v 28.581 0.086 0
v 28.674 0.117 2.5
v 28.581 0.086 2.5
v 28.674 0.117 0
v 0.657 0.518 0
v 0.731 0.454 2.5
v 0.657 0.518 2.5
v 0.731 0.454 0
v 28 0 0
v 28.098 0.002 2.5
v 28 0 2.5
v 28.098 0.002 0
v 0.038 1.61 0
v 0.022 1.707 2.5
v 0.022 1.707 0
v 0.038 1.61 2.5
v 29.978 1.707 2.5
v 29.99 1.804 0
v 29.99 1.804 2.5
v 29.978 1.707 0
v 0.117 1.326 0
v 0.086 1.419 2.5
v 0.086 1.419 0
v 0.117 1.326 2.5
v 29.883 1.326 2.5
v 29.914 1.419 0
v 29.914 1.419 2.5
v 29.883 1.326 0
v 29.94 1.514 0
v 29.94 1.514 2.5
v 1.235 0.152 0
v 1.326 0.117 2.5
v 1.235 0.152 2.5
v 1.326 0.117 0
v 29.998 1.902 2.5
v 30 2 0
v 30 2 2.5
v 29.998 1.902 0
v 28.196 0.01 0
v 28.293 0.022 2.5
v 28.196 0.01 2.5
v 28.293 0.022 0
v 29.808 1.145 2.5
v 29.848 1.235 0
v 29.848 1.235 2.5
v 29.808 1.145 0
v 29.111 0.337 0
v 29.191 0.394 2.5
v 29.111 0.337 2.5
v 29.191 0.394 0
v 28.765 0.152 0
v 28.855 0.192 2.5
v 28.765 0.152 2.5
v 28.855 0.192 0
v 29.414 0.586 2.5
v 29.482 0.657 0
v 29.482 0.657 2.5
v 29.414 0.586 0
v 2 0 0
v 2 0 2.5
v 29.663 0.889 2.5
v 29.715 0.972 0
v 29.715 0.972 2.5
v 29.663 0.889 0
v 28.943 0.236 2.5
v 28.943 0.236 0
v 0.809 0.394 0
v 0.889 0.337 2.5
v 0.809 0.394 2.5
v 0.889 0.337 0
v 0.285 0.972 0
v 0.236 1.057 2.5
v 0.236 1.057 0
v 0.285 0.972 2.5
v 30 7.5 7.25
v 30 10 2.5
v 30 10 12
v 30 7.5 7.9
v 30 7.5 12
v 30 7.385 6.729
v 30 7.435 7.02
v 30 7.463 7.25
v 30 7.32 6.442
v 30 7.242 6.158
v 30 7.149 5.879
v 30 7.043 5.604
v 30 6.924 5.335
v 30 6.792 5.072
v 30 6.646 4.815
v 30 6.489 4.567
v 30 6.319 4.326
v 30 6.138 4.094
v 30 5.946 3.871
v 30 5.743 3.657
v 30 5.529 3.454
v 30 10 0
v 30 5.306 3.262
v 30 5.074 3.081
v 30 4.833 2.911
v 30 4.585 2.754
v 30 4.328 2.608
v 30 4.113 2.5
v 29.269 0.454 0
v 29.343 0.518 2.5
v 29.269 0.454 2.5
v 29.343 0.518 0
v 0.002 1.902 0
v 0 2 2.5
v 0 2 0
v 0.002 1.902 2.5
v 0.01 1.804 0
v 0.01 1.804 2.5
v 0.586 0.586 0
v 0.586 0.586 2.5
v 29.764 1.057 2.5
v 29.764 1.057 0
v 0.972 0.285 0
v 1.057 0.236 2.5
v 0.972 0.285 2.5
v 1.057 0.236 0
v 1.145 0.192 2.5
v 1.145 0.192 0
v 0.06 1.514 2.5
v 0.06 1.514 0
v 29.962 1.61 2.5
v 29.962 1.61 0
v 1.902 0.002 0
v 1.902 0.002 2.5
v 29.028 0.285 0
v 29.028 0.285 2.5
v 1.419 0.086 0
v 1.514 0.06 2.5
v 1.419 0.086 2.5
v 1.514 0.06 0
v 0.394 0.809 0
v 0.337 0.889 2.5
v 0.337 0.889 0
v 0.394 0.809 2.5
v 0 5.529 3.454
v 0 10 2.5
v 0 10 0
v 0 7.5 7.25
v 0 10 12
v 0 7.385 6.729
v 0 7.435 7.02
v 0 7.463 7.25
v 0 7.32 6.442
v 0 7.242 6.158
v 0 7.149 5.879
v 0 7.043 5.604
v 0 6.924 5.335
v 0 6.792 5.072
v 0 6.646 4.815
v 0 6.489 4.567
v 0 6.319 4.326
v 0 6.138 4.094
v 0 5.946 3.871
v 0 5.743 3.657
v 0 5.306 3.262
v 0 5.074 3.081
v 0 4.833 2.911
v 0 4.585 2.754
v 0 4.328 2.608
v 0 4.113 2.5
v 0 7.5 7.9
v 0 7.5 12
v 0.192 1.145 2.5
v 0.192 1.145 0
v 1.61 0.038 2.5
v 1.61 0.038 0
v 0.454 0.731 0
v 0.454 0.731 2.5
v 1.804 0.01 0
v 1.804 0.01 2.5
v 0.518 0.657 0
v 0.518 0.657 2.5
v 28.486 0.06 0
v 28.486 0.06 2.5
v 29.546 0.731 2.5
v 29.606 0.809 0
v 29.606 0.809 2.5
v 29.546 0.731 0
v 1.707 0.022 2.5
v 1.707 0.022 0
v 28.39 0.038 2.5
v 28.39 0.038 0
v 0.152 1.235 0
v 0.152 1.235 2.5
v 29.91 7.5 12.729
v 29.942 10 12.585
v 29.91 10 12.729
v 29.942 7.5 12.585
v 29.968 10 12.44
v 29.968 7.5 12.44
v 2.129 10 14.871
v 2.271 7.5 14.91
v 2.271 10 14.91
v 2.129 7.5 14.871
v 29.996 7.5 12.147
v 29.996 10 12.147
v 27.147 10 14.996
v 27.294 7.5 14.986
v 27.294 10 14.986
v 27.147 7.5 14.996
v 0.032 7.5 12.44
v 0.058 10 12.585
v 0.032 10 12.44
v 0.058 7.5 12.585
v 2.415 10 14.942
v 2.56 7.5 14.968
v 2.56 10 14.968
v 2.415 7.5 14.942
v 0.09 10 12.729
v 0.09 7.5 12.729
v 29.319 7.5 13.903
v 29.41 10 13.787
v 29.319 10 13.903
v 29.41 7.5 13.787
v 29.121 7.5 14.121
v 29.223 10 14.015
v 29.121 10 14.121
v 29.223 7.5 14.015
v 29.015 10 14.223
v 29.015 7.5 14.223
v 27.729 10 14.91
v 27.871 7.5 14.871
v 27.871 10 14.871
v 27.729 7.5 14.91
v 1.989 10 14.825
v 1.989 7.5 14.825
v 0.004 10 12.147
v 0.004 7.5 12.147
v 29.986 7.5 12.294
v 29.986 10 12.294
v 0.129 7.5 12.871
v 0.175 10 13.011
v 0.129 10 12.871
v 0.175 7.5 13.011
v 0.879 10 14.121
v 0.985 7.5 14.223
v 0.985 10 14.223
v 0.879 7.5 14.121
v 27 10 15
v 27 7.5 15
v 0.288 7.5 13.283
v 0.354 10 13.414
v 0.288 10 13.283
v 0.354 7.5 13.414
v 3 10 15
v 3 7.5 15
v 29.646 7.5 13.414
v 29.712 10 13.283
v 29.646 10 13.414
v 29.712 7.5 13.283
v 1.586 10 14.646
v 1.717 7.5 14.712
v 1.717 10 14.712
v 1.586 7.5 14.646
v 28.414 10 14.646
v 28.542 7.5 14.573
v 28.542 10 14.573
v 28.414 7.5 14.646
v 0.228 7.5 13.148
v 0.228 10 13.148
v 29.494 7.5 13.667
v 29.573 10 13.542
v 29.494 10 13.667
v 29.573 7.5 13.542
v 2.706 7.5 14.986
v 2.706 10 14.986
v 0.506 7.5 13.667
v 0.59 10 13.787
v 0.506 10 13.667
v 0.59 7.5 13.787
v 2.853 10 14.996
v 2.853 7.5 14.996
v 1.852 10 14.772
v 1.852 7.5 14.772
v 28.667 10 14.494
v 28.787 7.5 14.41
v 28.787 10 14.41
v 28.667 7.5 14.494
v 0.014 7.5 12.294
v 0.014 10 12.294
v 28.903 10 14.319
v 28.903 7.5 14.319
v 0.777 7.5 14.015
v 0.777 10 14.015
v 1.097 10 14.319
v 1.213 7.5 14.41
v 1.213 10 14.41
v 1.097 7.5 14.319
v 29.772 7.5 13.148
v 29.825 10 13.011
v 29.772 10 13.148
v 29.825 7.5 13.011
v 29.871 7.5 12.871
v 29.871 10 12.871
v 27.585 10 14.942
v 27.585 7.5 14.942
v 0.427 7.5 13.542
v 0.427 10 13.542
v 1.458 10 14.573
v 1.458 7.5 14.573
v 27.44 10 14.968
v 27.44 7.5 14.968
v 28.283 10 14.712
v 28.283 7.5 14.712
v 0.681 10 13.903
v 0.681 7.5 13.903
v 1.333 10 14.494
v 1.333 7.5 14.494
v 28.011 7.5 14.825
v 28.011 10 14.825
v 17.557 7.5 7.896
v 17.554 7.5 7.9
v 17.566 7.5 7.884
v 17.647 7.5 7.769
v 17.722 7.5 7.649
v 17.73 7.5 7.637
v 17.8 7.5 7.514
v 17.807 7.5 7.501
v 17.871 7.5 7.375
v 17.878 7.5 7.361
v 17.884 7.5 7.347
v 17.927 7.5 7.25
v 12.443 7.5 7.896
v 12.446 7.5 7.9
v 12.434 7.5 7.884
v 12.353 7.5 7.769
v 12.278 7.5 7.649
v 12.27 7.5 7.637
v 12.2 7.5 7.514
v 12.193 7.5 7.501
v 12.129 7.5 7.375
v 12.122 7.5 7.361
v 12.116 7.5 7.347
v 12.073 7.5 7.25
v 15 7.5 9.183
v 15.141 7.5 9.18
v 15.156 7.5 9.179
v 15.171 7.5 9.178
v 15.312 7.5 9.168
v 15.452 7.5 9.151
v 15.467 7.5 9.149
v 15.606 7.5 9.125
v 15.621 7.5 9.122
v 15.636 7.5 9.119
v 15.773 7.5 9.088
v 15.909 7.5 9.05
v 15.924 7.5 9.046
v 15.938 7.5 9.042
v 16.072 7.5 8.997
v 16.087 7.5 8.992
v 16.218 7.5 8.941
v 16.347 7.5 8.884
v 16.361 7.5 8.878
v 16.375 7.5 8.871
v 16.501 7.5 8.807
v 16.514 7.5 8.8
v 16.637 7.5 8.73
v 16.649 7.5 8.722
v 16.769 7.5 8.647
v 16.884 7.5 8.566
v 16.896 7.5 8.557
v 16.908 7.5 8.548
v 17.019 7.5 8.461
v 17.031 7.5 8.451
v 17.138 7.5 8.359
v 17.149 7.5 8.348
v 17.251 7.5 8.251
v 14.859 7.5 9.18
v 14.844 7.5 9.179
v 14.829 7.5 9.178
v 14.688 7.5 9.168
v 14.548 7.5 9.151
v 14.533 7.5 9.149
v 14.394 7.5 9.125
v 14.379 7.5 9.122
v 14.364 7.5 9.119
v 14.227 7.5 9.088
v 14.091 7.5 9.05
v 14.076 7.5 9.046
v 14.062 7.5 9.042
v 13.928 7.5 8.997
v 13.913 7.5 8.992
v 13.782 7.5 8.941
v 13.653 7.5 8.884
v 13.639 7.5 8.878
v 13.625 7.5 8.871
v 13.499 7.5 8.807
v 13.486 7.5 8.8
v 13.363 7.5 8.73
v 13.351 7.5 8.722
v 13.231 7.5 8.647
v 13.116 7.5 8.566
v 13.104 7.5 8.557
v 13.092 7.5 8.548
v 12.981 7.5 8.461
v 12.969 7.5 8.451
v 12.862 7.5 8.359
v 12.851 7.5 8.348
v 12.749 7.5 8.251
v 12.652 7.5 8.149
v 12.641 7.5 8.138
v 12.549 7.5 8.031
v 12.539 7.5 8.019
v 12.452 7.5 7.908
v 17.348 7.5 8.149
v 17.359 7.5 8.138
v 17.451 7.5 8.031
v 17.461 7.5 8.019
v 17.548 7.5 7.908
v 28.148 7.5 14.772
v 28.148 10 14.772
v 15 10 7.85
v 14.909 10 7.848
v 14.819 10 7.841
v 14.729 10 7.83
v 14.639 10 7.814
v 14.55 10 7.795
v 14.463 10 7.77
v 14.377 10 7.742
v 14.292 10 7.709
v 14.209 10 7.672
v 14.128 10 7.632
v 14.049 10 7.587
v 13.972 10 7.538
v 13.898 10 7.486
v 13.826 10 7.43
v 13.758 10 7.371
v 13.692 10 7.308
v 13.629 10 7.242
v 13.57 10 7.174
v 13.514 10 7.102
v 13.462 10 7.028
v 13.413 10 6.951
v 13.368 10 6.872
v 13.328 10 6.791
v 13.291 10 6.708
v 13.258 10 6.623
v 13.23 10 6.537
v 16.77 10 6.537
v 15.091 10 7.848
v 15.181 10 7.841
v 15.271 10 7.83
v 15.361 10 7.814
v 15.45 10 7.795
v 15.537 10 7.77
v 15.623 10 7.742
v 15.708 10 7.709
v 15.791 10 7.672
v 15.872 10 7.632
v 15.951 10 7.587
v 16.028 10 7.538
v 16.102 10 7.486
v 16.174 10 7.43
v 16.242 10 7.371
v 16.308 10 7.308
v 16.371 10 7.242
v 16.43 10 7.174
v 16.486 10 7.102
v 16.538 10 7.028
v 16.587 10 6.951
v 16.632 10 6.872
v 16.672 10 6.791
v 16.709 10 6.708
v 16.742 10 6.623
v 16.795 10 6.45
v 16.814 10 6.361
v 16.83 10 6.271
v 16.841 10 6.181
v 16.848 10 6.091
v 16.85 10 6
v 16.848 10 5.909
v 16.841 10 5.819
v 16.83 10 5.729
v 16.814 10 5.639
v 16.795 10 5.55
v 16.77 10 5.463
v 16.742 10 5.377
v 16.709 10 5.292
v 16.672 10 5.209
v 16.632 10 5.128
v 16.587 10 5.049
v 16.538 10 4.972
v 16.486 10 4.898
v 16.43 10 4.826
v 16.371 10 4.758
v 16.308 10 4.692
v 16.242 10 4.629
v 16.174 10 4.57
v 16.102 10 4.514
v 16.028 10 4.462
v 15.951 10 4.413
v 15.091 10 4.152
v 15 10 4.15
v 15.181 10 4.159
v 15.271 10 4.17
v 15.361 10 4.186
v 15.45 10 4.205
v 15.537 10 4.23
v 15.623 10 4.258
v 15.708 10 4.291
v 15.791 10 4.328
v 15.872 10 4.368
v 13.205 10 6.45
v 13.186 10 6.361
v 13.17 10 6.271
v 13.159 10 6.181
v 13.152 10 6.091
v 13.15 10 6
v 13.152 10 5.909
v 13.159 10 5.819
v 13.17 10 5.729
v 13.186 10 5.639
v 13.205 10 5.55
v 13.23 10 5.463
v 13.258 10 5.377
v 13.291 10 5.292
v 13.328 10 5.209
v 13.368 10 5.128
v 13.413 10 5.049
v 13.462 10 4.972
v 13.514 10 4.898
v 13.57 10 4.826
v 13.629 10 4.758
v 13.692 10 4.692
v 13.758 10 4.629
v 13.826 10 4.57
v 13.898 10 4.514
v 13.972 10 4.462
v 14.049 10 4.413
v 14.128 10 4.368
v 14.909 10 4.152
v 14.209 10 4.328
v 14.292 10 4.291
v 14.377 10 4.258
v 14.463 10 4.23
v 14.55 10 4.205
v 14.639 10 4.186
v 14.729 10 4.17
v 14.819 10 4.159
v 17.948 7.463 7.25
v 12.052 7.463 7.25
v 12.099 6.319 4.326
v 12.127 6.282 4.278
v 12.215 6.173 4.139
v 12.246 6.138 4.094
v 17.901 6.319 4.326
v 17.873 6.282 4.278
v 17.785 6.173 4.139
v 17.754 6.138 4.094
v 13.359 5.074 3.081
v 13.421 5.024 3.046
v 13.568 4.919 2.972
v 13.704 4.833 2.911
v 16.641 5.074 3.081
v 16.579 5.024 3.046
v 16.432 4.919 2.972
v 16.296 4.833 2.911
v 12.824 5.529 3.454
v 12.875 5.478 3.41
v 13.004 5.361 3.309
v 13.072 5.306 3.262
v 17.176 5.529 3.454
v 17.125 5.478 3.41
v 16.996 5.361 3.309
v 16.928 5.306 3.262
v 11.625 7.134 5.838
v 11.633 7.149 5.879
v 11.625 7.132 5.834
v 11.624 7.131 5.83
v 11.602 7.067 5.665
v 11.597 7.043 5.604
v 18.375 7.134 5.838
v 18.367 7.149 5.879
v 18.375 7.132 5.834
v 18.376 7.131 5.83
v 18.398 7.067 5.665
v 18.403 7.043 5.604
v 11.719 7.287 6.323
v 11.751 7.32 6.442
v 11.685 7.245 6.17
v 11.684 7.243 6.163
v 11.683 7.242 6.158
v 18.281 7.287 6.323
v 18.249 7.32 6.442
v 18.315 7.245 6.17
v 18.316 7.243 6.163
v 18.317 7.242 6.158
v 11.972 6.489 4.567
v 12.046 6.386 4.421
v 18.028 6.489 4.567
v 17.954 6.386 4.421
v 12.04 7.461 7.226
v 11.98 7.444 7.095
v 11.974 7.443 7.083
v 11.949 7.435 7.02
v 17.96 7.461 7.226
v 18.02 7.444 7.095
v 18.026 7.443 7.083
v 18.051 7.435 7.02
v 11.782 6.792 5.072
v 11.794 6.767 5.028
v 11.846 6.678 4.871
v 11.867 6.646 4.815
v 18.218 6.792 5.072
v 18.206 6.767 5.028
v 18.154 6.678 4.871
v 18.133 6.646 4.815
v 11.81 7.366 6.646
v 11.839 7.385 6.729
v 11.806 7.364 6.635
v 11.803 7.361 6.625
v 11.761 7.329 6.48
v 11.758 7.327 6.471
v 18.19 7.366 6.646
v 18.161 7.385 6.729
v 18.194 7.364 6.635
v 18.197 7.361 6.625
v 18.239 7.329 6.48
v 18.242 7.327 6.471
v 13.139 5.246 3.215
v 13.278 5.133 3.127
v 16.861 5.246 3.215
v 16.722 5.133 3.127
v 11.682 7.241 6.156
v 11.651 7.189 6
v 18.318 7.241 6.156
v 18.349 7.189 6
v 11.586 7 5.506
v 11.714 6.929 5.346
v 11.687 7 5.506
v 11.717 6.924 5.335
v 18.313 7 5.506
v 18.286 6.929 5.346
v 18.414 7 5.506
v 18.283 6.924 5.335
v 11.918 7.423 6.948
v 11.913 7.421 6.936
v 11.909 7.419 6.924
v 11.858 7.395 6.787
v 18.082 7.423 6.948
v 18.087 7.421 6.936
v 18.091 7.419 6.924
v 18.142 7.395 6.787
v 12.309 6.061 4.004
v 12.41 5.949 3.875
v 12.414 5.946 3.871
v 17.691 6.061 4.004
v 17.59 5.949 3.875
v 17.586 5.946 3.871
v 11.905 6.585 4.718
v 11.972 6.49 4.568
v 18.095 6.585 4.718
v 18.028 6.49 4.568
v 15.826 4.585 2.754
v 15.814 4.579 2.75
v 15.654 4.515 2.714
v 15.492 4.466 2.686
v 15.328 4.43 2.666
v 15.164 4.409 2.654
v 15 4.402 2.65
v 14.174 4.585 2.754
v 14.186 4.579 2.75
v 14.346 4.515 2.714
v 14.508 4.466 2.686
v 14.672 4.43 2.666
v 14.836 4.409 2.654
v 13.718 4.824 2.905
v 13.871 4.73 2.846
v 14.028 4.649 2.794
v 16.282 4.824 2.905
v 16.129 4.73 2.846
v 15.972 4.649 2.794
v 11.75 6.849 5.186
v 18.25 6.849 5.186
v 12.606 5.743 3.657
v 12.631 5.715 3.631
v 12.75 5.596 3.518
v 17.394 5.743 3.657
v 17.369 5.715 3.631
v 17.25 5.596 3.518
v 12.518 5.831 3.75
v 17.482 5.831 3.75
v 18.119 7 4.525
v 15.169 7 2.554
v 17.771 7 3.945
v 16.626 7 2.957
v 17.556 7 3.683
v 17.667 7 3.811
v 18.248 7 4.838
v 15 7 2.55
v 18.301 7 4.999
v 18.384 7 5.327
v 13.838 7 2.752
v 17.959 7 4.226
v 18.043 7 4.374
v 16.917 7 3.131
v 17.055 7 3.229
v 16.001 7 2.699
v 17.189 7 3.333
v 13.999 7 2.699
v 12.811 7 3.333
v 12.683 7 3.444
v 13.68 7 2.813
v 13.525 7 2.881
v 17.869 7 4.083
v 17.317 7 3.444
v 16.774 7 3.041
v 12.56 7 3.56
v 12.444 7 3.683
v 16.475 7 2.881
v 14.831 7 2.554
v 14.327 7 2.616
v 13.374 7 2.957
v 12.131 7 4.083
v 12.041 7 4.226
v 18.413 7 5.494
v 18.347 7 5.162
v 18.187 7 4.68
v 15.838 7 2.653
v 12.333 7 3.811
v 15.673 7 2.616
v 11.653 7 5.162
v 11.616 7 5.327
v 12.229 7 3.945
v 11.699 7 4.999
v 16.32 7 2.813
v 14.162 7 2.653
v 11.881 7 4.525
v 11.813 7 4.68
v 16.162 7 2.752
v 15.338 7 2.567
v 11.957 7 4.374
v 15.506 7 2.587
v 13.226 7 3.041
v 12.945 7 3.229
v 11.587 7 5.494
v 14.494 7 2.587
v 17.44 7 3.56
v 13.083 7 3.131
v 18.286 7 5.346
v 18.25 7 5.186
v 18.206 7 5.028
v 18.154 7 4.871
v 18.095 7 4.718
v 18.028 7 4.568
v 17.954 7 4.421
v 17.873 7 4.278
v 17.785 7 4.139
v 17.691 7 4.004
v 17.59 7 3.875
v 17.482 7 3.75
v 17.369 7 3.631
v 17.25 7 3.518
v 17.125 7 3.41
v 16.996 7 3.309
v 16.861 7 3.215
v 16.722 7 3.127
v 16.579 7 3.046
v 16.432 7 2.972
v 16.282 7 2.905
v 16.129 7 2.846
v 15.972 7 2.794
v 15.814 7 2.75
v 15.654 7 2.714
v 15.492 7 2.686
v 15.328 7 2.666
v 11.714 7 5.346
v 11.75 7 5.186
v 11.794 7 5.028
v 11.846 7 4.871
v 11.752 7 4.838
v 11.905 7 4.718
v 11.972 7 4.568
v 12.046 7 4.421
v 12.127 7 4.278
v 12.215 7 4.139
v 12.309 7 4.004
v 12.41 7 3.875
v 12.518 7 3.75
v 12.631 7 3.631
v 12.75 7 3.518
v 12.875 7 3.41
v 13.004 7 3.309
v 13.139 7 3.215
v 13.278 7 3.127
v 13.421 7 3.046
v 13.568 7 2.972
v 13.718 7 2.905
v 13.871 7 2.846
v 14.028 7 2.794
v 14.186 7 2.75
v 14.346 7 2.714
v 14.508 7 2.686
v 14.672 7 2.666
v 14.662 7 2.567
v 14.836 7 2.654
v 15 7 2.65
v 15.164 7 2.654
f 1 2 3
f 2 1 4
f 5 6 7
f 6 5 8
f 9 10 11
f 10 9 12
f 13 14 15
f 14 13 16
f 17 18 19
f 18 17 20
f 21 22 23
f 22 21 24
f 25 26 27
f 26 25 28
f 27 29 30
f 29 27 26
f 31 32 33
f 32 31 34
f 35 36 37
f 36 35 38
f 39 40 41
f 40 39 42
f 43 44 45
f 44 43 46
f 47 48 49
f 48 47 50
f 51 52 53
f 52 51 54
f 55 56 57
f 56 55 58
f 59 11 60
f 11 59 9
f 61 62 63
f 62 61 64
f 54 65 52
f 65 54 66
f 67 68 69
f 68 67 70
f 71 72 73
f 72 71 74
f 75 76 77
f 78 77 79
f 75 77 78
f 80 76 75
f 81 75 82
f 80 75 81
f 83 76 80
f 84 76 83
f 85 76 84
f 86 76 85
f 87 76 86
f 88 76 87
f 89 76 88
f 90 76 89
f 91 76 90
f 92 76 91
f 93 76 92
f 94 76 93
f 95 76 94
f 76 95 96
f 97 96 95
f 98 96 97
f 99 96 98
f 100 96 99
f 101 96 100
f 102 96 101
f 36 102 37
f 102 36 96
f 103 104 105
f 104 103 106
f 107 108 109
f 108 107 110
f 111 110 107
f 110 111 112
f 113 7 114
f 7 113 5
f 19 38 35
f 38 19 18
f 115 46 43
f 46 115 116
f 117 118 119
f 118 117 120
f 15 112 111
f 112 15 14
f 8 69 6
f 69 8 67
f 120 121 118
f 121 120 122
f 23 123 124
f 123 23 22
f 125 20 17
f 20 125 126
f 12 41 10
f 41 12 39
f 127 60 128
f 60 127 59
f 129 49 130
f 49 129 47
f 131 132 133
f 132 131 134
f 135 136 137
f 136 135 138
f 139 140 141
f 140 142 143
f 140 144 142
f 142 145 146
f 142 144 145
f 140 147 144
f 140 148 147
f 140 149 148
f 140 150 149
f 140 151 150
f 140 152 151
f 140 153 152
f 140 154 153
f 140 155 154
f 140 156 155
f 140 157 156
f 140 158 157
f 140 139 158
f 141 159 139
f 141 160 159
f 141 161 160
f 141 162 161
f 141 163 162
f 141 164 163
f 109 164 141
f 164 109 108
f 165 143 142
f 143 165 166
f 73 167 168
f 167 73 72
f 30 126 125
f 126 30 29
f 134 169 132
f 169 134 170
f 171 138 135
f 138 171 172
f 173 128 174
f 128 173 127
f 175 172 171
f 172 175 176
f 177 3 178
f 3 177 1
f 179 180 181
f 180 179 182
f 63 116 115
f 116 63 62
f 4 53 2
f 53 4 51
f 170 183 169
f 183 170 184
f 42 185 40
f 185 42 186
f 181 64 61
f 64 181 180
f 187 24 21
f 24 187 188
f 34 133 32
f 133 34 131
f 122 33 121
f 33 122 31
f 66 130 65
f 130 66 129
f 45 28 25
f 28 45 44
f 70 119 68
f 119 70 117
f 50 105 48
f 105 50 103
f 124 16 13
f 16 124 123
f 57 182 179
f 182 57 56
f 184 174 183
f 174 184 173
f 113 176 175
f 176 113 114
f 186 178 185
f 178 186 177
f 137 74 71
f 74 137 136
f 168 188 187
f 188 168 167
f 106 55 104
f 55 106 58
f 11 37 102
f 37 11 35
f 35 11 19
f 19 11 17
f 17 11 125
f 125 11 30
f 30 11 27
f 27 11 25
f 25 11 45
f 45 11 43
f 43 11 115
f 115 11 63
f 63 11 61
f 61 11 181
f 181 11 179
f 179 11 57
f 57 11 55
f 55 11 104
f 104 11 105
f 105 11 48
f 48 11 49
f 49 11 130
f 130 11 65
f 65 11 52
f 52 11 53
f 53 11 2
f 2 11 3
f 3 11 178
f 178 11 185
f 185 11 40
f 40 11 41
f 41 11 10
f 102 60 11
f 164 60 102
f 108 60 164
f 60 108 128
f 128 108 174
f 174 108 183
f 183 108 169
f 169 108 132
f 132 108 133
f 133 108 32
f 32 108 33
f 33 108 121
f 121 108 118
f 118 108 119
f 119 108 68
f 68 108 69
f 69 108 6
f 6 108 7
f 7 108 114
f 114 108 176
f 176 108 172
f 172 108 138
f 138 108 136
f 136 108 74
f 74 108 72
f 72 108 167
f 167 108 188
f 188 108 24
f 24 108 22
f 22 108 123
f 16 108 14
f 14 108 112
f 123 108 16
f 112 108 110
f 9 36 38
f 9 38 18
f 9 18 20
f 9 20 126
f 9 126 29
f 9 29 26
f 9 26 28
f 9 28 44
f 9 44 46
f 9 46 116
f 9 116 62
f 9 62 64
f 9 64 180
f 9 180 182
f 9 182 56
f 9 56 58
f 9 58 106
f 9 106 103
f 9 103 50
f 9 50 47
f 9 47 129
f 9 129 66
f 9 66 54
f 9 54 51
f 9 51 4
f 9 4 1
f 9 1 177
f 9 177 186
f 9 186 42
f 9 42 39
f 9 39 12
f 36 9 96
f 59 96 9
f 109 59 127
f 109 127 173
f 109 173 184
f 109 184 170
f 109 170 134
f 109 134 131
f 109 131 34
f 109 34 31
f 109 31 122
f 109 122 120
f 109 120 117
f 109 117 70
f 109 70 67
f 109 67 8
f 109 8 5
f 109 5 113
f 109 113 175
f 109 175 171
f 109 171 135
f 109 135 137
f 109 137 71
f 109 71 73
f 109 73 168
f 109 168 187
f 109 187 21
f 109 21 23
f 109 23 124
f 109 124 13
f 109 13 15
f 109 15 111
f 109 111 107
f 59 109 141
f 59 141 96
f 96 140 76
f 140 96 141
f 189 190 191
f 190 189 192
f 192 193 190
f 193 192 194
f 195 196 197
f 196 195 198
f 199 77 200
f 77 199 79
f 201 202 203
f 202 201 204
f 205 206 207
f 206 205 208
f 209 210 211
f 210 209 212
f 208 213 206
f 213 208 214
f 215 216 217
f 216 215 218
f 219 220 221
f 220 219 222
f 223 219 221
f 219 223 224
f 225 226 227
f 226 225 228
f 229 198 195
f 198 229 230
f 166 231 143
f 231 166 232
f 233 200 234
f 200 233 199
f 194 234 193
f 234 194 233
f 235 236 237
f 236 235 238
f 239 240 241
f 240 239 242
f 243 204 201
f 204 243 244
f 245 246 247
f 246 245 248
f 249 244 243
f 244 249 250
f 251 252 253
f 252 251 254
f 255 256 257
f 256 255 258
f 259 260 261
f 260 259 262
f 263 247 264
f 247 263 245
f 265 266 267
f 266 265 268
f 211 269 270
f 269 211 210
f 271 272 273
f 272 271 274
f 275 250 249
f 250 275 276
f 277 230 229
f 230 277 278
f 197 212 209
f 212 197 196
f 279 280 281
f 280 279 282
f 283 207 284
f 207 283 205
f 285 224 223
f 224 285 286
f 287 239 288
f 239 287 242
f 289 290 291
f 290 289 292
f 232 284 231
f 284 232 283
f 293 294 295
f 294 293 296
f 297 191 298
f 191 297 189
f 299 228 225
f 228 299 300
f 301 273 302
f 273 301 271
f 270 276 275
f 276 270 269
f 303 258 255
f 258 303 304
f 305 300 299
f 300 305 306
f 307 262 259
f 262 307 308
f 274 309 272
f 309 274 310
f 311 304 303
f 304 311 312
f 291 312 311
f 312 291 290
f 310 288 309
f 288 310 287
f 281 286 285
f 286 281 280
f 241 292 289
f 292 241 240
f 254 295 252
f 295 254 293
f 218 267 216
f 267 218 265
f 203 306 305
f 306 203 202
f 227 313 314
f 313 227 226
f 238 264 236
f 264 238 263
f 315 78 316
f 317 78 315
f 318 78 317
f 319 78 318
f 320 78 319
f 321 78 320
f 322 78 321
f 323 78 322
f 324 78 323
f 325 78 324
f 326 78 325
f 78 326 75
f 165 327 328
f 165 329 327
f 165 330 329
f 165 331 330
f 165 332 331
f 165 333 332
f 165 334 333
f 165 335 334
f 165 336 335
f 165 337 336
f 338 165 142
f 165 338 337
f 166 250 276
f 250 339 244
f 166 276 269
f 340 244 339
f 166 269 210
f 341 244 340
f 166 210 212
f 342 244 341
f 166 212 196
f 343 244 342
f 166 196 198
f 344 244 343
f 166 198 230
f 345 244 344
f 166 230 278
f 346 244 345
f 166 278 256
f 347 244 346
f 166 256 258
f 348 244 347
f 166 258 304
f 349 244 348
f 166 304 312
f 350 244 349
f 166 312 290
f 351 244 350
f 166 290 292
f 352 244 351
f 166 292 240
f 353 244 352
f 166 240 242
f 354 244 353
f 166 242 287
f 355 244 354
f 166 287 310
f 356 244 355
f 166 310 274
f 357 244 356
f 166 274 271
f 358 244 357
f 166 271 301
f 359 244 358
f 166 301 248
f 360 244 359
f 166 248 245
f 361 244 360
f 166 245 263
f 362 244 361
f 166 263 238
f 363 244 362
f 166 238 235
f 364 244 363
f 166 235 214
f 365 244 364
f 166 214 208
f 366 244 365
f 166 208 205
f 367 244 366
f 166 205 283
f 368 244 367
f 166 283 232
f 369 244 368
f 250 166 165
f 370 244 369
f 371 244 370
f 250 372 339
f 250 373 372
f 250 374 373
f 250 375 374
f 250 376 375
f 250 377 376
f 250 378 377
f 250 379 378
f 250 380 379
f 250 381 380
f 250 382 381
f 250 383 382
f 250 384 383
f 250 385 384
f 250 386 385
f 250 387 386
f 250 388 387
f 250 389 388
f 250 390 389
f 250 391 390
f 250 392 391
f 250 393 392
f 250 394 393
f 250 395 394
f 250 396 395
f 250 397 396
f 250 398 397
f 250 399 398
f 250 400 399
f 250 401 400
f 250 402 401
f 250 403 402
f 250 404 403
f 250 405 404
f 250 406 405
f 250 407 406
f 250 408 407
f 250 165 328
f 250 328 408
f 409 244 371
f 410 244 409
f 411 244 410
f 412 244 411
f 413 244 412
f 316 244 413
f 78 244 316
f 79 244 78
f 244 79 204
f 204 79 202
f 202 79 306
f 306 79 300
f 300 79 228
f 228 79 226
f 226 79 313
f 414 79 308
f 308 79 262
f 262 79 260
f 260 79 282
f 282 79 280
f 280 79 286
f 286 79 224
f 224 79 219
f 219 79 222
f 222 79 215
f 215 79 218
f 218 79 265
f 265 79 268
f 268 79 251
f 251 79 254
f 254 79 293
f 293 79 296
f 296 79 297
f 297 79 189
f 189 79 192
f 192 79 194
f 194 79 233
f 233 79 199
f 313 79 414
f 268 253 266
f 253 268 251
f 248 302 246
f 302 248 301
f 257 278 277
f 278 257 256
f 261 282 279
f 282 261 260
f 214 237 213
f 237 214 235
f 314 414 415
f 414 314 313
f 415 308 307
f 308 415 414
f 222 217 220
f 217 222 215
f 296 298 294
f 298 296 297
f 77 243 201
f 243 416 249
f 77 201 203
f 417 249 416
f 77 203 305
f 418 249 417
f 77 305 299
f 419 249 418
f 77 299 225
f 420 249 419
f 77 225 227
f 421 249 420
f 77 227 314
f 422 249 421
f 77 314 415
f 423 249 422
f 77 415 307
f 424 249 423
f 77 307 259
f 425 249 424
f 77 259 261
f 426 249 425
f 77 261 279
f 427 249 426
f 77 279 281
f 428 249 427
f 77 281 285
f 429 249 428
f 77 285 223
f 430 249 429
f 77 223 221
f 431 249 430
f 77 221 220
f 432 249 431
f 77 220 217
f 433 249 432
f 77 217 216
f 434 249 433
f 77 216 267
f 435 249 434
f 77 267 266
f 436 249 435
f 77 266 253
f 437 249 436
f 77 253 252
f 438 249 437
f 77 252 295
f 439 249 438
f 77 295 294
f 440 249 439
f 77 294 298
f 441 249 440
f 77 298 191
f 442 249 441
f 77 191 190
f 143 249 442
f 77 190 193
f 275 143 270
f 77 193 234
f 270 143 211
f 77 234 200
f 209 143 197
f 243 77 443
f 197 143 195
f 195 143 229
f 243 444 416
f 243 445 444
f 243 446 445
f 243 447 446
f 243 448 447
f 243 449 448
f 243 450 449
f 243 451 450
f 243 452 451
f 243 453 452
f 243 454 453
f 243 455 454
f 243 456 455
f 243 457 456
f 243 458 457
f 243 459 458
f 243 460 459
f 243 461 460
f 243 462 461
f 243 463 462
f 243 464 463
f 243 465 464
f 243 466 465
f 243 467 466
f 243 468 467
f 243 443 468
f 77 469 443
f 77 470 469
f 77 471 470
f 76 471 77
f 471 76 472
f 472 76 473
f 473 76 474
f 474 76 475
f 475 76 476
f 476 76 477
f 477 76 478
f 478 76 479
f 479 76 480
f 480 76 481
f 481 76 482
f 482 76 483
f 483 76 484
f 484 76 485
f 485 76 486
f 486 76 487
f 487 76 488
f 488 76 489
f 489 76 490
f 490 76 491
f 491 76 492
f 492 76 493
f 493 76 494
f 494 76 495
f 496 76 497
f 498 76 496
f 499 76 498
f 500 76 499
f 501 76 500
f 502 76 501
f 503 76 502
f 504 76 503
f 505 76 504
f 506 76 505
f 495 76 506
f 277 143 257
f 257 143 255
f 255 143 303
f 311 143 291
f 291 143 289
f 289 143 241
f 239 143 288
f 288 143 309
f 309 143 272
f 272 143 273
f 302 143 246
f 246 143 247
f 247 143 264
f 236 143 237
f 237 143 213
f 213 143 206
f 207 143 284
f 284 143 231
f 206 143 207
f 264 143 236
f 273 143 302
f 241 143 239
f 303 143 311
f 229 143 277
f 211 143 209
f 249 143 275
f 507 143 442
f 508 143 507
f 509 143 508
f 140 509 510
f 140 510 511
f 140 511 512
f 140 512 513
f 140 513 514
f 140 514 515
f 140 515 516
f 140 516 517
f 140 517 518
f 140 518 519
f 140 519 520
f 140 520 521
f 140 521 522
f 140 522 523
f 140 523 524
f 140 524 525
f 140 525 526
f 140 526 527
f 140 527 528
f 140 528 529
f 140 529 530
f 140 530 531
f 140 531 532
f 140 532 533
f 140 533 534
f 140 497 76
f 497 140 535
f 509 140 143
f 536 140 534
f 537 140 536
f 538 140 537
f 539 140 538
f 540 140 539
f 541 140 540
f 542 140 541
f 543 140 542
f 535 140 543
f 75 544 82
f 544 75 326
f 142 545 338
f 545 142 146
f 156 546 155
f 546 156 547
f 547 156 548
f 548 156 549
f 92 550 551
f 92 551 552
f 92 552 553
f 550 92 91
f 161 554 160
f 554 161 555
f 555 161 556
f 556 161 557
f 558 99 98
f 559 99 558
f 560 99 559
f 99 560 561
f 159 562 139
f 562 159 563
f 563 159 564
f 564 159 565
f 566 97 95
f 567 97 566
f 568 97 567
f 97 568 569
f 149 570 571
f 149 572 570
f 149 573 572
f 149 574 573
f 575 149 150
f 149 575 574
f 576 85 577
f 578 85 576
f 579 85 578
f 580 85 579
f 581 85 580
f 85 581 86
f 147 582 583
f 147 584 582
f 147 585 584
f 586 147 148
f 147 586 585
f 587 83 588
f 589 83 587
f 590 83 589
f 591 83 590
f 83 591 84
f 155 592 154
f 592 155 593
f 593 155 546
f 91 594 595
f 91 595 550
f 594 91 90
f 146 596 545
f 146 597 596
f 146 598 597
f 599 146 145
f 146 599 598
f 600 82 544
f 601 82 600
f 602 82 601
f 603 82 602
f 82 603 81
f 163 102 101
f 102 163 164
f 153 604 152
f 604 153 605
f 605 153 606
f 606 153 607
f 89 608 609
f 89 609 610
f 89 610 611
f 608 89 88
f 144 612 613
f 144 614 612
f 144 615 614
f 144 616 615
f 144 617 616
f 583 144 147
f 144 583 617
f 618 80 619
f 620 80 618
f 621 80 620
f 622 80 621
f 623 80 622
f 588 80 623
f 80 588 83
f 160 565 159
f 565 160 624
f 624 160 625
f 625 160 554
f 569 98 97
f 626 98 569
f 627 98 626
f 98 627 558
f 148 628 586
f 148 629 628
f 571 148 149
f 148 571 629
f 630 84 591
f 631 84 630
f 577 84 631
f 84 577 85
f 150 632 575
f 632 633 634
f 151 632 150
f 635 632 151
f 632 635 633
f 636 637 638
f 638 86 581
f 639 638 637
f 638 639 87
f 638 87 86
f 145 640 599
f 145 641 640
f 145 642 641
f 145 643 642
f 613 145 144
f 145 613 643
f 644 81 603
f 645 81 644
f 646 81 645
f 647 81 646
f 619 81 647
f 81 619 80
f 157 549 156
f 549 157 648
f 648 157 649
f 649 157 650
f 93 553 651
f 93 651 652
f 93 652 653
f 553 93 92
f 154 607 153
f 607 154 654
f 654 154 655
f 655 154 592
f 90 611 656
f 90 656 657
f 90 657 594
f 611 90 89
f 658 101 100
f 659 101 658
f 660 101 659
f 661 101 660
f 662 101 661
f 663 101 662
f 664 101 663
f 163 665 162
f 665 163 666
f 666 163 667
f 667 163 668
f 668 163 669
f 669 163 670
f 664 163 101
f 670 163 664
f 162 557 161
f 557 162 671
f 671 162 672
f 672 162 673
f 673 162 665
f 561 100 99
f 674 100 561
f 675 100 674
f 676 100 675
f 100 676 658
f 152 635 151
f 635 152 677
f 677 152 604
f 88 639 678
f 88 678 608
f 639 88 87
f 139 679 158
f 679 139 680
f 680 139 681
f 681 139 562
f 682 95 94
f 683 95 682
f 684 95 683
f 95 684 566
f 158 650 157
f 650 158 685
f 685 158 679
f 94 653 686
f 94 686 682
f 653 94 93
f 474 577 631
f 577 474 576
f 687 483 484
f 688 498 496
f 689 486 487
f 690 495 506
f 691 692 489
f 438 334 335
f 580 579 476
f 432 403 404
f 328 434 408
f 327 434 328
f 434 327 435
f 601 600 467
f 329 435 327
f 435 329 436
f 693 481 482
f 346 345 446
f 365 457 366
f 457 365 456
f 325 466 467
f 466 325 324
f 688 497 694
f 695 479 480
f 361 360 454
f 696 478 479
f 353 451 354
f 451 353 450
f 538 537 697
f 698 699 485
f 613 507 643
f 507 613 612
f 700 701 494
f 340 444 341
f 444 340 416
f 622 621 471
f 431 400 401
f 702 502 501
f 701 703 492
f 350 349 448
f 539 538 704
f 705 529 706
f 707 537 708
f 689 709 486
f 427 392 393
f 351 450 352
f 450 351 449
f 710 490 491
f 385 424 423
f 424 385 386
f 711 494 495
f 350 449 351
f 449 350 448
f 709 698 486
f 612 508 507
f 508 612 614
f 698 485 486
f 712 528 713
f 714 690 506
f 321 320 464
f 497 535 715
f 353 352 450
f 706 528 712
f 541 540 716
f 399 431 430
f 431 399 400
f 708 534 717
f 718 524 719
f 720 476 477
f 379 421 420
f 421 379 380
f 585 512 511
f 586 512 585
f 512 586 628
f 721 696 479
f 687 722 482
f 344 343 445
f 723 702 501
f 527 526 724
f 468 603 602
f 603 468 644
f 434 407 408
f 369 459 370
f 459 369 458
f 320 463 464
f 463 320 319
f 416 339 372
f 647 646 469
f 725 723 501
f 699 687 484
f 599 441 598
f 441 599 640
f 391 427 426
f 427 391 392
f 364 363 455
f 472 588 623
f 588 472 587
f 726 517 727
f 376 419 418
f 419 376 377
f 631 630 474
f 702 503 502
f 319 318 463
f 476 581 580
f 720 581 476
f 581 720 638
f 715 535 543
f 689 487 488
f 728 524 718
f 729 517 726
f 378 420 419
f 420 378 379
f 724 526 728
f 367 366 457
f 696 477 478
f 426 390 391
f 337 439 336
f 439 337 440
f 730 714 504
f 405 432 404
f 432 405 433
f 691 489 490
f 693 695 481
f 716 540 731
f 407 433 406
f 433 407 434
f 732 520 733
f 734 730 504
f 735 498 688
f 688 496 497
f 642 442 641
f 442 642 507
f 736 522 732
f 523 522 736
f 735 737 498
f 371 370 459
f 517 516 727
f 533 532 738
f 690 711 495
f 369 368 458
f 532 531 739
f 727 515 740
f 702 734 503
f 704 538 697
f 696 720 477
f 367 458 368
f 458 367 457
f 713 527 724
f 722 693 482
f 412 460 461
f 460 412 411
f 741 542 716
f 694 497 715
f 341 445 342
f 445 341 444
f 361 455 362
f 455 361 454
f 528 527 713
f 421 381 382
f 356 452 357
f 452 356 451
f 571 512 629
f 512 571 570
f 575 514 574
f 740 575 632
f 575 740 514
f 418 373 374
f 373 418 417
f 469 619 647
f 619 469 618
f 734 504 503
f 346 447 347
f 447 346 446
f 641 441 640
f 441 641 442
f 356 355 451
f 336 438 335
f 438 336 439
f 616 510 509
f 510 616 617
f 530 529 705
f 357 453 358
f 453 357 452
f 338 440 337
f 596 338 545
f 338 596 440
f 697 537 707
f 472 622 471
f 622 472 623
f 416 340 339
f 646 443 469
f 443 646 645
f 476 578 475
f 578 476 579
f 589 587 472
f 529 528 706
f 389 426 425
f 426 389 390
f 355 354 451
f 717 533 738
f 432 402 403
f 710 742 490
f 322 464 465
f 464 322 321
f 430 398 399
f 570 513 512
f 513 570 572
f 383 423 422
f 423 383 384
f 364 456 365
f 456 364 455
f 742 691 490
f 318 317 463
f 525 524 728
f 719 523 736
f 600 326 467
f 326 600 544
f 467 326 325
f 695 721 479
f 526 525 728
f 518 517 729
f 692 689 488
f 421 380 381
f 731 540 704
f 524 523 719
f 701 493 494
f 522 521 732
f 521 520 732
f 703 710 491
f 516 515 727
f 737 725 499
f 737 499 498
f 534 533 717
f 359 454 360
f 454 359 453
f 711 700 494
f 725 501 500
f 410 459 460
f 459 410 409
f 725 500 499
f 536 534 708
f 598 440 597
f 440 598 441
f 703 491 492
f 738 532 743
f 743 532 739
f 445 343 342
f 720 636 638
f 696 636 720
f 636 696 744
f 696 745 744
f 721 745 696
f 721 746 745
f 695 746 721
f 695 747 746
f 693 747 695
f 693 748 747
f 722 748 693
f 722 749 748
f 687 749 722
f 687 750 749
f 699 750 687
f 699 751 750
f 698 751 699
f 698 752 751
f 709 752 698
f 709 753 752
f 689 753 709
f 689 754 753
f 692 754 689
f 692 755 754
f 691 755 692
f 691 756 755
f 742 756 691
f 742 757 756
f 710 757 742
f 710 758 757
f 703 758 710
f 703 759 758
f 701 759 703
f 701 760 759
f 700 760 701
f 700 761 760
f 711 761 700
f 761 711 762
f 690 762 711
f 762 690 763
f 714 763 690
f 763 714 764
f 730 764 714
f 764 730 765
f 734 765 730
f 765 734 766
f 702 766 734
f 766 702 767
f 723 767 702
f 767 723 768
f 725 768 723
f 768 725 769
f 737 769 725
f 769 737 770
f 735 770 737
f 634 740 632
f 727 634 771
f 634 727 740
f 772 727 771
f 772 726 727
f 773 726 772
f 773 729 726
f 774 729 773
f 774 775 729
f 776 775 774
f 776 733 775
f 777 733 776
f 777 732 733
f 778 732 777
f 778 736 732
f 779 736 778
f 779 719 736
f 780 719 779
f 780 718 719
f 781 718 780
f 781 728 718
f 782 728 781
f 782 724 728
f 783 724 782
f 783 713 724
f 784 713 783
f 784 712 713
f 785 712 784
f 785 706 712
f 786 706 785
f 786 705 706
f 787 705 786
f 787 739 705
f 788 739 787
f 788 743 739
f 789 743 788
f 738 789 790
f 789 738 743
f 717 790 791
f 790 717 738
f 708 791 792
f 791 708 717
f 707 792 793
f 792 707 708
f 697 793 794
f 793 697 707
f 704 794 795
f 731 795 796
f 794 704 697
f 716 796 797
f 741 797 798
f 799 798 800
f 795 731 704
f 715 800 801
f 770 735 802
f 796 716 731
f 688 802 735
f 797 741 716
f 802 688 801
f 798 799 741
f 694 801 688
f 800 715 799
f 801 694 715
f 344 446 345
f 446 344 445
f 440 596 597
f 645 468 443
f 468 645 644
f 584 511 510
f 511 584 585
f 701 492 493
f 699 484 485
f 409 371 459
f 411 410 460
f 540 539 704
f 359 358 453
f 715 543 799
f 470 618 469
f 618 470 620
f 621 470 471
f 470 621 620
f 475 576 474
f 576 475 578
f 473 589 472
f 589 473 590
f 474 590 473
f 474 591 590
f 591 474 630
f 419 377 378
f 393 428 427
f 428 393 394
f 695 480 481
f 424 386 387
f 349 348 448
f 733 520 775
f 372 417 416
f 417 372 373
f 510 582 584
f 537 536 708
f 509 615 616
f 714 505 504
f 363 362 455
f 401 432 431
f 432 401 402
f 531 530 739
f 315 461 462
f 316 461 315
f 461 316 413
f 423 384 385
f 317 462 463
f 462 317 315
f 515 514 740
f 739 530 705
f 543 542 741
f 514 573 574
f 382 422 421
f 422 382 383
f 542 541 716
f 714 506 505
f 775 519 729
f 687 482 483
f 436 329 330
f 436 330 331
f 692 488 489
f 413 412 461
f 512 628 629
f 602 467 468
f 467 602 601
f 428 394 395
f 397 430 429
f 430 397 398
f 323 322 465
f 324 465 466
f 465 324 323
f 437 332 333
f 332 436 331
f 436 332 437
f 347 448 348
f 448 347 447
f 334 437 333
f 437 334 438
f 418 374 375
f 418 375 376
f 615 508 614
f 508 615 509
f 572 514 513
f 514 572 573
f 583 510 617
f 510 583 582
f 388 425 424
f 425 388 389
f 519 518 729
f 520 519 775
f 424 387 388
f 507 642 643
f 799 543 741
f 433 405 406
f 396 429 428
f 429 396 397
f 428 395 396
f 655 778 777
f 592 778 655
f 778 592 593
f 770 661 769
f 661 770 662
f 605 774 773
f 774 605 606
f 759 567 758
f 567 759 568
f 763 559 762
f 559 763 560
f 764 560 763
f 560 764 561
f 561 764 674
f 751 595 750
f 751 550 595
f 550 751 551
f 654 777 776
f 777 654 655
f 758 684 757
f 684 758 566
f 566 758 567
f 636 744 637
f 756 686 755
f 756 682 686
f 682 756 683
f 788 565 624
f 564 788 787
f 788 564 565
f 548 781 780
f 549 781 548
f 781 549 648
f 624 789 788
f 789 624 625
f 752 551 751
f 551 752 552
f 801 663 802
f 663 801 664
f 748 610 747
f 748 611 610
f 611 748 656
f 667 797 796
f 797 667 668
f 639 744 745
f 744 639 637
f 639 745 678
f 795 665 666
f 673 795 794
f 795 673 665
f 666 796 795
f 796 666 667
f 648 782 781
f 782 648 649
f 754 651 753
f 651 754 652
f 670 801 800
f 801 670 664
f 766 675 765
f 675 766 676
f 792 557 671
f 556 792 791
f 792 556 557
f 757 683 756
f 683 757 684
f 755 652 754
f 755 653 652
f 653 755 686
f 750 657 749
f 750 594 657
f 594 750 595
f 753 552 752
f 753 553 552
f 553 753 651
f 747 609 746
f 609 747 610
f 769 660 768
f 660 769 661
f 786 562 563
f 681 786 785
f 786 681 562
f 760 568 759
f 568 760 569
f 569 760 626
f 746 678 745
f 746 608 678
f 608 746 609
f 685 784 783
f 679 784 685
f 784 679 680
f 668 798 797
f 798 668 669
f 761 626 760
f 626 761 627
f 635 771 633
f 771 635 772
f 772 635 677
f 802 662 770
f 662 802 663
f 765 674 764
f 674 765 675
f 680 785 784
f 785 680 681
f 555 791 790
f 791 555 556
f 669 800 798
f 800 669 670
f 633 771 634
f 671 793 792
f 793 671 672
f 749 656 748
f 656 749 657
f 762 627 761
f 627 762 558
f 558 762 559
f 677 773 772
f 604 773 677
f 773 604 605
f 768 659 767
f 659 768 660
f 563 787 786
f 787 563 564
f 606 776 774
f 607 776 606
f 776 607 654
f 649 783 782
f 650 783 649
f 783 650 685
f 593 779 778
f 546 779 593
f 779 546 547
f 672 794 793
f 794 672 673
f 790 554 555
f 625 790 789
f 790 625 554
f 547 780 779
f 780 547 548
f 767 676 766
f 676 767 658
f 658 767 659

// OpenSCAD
// file: ../lib/common.scad
/* A library of common modules, functions and variables
 * used by other *.scad files in this repository
 * by Mikrotron d.o.o. 2022
 * see the project root for license
 */
 
 /****************************************************************************
  ****************************** Variables ***********************************
  ****************************************************************************/

// Extra dimension to remove wall ambiguity in preview mode, too small to make
// any difference in 3D print, but you can set it to 0 if it bothers you ;-)
ex = 0.001;

// Make rounded objects smoother, if it slows down rendering, decrease the value.
// This is a general case value, it might be overridden for some objects and
// changing this value will have no effect for these objects
$fn = 128;

// Hole dimension correction - if 3D printed holes turn out too small,
// increase the value, or decrease the value if they're too big
// Default value is 0.4 mm
hdc = 0.4;

// Some common nuts and bolts dimensions, first number is bolt diameter
// and the second one is metric nut size (wrench size). To get value for
// specific bolts and nuts use functions bolt_dia() and nut2radius(),
// passing nuts_bolts index as parameter. If you need extra values, do
// not insert them, add them to the end of list or you'll corrupt 
// existing models
nuts_bolts = [ [1.6, 3.2],  // M1.6, index = 0
               [2, 4],      // M2,   index = 1
               [2.5, 5],    // M2.5, index = 2
               [3, 5.5],    // M3,   index = 3
               [4, 7],      // M4,   index = 4
               [5, 8],      // M5,   index = 5
               [6, 10],     // M6,   index = 6
               [8, 13],     // M8,   index = 7
               [10, 16] ];  // M10,  index = 8

// Set to true to see some example models, default is false
test = false;
if (test) test_draw();

/****************************************************************************
 ******************************* Modules ************************************
 ****************************************************************************/

// Set test variable to 'true' to see examples
module test_draw() {
    offset = 10;
    // Metric nuts
    for (i = [0 : len(nuts_bolts) - 1]) {
        translate([0, i*nut2dia(i), 0]) difference() {
            cylinder(d = nut2dia(i), h = bolt2dia(i), $fn = 6);
            translate(zex()) cylinder(d = bolt2dia(i), h = bolt2dia(i) + 2*ex);
        }
    }
    // Rounded rectangle
    translate([3*offset, 0, 0]) rounded_rect(5*offset, 3*offset, 5, 3);
    // Quarter of a cylinder
    translate([3*offset, 5*offset, 0]) cylinder_quarter(offset, 2*offset);
    // Cross beams
    translate([3*offset, 8*offset, 0]) cross_beams(3*offset, 5*offset, offset/4);
}

// Draws a rounded rectangle
module rounded_rect(x, y, z, radius = 1) {
    translate([radius,radius,0]) //move origin to outer limits
	linear_extrude(height=z)
		minkowski() {
			square([x-2*radius,y-2*radius]); //keep outer dimensions given by x and y
			circle(r = radius);
		}
}

// Draws quarter of a cylinder
module cylinder_quarter(r, h){    
    difference(){
        cylinder(r=r, h=h);
        translate ([-r-ex, -r-ex, -ex]) cube([2*r + 2*ex, r + ex, h + 2*ex]);
        translate ([-r-ex, -ex, -ex]) cube([r + ex, r + ex, h + 2*ex]);
    }
}

// Draws cross beams in the ractangle with sides a and b,
// used to shorten the print time
module cross_beams(rect_a, rect_b, beam_width){
    diag = sqrt(rect_a*rect_a + rect_b*rect_b);
    rot = atan2(rect_b, rect_a);
    translate([rect_a/2, rect_b/2, beam_width/2])
    difference(){
        union(){
            rotate(rot) cube([diag, beam_width, beam_width], true);
            rotate(-rot) cube([diag, beam_width, beam_width], true);
        }
        difference(){
            cube([rect_a + 2*beam_width, rect_b + 2*beam_width, beam_width + 2*ex], true);
            cube([rect_a, rect_b, beam_width + 4*ex], true);
        }
    }
}

/****************************************************************************
 ****************************** Functions ***********************************
 ****************************************************************************/
  
// Calculates nut diameter for given bolt_nuts index,
// check bolts_nuts list for index reference
function nut2dia(index) = nuts_bolts[index][1]/cos(180/6) + hdc/2;

// Calculates bolt diameter for given bolt_nuts index,
// check bolts_nuts list for index reference
function bolt2dia(index) = nuts_bolts[index][0] + hdc/2;

// Move to -ex on z axis
function zex() = [0, 0, -ex];
// main file
/*
 * This is simple rack shelf mount
 * developed by Mikrotron d.o.o. (http://mikrotron.hr).
 * It contains LED board mockups used for this project.
 *
 * This program is free software: you can redistribute it and/or modify
 * it under the terms of the GNU General Public License as published by
 * the Free Software Foundation, either version 3 of the License, or
 * (at your option) any later version. See the LICENSE file at the 
 * top-level directory of this distribution for details 
 *
 * This program is distributed in the hope that it will be useful,
 * but WITHOUT ANY WARRANTY; without even the implied warranty of
 * MERCHANTABILITY or FITNESS FOR A PARTICULAR PURPOSE.  See the
 * GNU General Public License for more details.
 *
 * You should have received a copy of the GNU General Public License
 * along with this program.  If not, see <https://www.gnu.org/licenses/>.
 */
 
// Use common library
include <../lib/common.scad>;
 
// Screw dimensions
screw_dia = 3.5;
screw_height = 20;
screw_head_dia = 6.7;
screw_head_height = 3;

// Mount dimensions
mount_length = 30;
mount_width_top = 10;
mount_width_side = 15;
mount_wall = 2.5;

//screw_model();
rack_shelf_mount();

module rack_shelf_mount() {
    screw_position = mount_width_side*0.4;
    difference() {
        union() {
            rack_shelf_mount_top();
            translate([0, mount_width_top - mount_wall, mount_wall]) rack_shelf_mount_side();
        }
        translate([mount_length/2, mount_width_top - screw_head_height, screw_position]) rotate([-90, 0, 0])
            screw_model();
        // We need a tunnel for screw head
        translate([mount_length/2, 0, screw_position]) rotate([-90, 0, 0])
            cylinder(d = screw_head_dia, h = mount_width_top - screw_head_height + ex);
    }
}

module rack_shelf_mount_side() {
    radius = 3;
    cut_radius = 6;
    translate([0, mount_wall, -radius]) rotate([90, 0, 0]) difference() {
        union() {
            rounded_rect(mount_length, mount_width_side - mount_wall + radius, mount_wall, radius);
            translate([0, 0, mount_wall])
                cube([mount_length, (mount_width_side - mount_wall + radius)/2, mount_width_top/2]);
        }
        translate([-ex, -ex, -ex]) 
            cube([mount_length + 2*ex, radius + ex, mount_wall + mount_width_top/2 + 2*ex]);
        translate([-ex, 1.4*cut_radius, cut_radius + mount_wall]) rotate([0, 90, 0])
            cylinder(d = 2*cut_radius, h = mount_length + 2*ex);
    }
}

module rack_shelf_mount_top() {
    radius = 2;
    difference() {
        rounded_rect(mount_length, mount_width_top + radius, mount_wall, radius);
        translate([-ex, mount_width_top, -ex]) 
            cube([mount_length + 2*ex, radius + ex, mount_wall + 2*ex]);
    }
}

// Draws screw mockup, adds tolerances for holes
module screw_model(tolerance = 0.2) {
    screw_head_dia = screw_head_dia + tolerance;
    screw_dia = screw_dia + tolerance;
    tip_height = 5;
    cylinder(d1 = screw_head_dia, d2 = screw_dia, h = screw_head_height);
    translate([0, 0, screw_head_height])
        cylinder(d = screw_dia, h = screw_height - screw_head_height - tip_height);
    translate([0, 0, screw_height - tip_height])
        cylinder(d1 = screw_dia, d2 = 0, h = tip_height);
}
